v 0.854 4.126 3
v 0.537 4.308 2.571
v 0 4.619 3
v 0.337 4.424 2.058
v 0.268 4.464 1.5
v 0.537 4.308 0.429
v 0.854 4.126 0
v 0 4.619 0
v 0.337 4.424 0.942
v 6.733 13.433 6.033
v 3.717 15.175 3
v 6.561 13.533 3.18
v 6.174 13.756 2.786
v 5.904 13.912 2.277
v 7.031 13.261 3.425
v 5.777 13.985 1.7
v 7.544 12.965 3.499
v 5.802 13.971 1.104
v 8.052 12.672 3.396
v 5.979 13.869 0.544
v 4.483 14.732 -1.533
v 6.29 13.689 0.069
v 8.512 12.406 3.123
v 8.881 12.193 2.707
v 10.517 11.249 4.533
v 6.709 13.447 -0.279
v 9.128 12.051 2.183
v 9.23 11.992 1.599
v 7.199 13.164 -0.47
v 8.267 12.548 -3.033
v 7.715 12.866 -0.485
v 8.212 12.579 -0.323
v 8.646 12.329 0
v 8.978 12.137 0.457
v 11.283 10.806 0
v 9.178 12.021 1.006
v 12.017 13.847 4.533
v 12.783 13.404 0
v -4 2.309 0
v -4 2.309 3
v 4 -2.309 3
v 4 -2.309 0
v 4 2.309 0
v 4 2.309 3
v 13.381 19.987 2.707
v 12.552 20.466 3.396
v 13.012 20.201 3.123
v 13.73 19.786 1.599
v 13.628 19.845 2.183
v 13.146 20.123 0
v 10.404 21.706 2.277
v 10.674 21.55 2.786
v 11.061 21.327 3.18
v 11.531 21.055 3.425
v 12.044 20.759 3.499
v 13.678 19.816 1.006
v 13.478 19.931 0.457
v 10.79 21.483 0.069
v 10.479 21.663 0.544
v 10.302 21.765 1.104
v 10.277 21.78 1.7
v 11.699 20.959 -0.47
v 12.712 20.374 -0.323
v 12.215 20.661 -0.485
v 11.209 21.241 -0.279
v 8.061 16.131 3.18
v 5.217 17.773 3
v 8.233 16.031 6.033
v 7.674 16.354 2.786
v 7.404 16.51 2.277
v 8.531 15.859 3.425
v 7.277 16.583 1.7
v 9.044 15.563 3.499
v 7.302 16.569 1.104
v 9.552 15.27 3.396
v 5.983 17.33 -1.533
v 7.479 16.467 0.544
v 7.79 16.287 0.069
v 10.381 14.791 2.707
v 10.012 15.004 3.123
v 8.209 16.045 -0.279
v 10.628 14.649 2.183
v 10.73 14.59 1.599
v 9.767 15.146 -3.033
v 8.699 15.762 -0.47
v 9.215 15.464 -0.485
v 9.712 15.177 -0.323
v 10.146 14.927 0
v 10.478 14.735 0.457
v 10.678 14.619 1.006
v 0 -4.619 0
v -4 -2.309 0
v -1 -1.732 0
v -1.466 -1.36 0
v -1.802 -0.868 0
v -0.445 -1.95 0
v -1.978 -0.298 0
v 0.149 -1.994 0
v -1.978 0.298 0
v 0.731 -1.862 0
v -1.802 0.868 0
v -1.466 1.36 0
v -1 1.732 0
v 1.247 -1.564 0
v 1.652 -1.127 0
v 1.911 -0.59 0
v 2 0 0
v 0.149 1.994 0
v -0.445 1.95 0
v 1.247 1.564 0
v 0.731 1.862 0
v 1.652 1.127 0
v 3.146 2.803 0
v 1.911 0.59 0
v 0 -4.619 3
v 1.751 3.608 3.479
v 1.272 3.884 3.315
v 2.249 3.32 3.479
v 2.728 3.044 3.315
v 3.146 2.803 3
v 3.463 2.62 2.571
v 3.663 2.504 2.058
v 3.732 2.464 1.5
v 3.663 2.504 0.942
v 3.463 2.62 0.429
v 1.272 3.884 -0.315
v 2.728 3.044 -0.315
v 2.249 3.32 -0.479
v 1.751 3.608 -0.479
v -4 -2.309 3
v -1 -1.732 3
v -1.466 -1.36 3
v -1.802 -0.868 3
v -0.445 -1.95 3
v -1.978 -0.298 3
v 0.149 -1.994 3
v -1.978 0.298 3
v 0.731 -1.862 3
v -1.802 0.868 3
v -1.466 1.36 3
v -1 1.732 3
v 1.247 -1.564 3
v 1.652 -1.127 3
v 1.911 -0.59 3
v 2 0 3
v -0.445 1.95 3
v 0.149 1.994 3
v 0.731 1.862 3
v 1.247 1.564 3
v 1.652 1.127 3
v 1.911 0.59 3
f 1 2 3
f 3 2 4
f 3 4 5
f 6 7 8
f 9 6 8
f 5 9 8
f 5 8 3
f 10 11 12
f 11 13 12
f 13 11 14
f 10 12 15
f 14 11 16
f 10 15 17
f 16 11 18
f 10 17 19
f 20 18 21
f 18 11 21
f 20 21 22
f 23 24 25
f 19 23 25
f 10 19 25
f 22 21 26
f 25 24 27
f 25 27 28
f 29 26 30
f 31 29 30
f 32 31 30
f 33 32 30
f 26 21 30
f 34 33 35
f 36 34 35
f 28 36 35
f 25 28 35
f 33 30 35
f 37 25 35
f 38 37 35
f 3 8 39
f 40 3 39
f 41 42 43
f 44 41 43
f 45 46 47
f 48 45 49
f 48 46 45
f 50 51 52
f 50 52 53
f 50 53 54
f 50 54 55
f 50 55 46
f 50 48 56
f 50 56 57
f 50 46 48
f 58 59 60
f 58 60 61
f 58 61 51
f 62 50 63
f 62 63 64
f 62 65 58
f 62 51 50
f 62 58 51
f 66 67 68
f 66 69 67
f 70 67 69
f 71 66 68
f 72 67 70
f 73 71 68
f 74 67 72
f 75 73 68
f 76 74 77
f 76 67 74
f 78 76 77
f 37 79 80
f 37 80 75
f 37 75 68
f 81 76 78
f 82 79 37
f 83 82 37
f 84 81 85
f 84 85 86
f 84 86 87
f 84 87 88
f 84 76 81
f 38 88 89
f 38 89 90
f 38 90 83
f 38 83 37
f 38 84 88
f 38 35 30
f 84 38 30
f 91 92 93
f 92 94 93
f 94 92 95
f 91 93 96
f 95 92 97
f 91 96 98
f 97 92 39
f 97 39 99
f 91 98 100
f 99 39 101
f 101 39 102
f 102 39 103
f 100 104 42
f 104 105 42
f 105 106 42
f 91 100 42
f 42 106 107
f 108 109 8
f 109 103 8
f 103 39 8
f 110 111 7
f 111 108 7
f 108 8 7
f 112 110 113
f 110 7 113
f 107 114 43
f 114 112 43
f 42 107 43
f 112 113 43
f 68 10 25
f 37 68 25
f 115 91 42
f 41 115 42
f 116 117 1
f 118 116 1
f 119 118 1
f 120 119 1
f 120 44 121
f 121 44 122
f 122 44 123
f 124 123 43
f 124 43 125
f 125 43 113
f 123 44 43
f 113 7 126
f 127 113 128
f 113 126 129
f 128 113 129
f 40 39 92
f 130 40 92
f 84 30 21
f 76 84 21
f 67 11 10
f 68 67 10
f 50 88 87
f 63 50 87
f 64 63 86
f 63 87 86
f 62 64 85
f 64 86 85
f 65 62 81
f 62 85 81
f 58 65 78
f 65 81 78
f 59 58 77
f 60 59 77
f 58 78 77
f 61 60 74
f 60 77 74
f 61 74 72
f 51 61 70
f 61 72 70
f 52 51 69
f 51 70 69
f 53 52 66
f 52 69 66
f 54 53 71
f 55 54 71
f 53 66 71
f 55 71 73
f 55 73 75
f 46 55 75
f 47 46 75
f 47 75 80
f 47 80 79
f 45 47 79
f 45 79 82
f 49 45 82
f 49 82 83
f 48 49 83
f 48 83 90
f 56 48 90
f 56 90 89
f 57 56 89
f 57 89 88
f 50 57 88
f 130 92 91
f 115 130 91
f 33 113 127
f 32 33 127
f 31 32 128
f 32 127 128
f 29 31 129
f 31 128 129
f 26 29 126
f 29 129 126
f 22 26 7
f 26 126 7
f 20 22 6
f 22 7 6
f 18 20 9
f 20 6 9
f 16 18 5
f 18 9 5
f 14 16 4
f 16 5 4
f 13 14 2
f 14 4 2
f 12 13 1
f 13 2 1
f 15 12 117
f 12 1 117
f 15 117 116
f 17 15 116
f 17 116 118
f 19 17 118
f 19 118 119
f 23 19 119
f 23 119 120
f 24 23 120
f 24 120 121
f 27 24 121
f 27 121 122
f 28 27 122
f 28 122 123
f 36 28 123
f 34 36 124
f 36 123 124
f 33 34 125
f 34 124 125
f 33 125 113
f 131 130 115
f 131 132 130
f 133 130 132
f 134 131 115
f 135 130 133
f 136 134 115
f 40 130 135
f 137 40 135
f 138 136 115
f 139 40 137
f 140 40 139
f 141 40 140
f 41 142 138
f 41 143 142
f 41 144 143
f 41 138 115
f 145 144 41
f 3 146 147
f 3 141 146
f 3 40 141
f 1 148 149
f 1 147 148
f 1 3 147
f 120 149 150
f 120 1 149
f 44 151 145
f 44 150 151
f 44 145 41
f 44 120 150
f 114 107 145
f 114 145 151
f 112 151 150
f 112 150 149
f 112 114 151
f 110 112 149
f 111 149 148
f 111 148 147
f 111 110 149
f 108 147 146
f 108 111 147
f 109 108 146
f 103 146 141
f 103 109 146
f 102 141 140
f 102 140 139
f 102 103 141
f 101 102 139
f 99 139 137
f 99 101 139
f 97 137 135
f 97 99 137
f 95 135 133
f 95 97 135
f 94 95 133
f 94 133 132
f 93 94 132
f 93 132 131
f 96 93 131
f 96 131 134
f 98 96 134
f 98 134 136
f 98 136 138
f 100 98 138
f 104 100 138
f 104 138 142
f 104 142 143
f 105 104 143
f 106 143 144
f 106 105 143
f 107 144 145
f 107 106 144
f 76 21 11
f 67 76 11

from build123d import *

# Parameters (mm, degrees)
SKETCH2_R           = 2
BOSS_EXTRUDE2_DEPTH = 3
SKETCH3_R           = 2
BOSS_EXTRUDE3_DEPTH = 20
BOSS_EXTRUDE4_DEPTH = 3


with BuildPart() as part:
    # Sketch2 → Boss-Extrude2 (new body)
    with BuildSketch(Plane.XY):
        Polygon((0, 4.618802154), (-4, 2.309401077), (-4, -2.309401077), (0, -4.618802154), (4, -2.309401077), (4, 2.309401077), align=None)
        Circle(SKETCH2_R, mode=Mode.SUBTRACT)
    extrude(amount=BOSS_EXTRUDE2_DEPTH)

    # Sketch3 → Boss-Extrude3 (add)
    with BuildSketch(Plane(origin=(2, 3.464101615, 0), x_dir=(0.8660254037844386, -0.4999999999999999, 0), z_dir=(0.49999999999999994, 0.8660254037844387, 0))):
        with Locations(Location((0, -1.5, 0), (0, 0, 48.590377891))):
            Circle(SKETCH3_R)
    extrude(amount=BOSS_EXTRUDE3_DEPTH)

    # Sketch4 → Boss-Extrude4 (add)
    with BuildSketch(Plane(origin=(7.5, 12.990381057, 0), x_dir=(0.8660254037844386, -0.4999999999999999, 0), z_dir=(0.49999999999999994, 0.8660254037844387, 0))):
        Polygon((0.885290866, 3.033165937), (-3.483191429, 1.533267348), (-4.368482294, -2.999898589), (-0.885290866, -6.033165937), (3.483191429, -4.533267348), (4.368482294, -0.000101411), align=None)
    extrude(amount=BOSS_EXTRUDE4_DEPTH)


solid = part.part
